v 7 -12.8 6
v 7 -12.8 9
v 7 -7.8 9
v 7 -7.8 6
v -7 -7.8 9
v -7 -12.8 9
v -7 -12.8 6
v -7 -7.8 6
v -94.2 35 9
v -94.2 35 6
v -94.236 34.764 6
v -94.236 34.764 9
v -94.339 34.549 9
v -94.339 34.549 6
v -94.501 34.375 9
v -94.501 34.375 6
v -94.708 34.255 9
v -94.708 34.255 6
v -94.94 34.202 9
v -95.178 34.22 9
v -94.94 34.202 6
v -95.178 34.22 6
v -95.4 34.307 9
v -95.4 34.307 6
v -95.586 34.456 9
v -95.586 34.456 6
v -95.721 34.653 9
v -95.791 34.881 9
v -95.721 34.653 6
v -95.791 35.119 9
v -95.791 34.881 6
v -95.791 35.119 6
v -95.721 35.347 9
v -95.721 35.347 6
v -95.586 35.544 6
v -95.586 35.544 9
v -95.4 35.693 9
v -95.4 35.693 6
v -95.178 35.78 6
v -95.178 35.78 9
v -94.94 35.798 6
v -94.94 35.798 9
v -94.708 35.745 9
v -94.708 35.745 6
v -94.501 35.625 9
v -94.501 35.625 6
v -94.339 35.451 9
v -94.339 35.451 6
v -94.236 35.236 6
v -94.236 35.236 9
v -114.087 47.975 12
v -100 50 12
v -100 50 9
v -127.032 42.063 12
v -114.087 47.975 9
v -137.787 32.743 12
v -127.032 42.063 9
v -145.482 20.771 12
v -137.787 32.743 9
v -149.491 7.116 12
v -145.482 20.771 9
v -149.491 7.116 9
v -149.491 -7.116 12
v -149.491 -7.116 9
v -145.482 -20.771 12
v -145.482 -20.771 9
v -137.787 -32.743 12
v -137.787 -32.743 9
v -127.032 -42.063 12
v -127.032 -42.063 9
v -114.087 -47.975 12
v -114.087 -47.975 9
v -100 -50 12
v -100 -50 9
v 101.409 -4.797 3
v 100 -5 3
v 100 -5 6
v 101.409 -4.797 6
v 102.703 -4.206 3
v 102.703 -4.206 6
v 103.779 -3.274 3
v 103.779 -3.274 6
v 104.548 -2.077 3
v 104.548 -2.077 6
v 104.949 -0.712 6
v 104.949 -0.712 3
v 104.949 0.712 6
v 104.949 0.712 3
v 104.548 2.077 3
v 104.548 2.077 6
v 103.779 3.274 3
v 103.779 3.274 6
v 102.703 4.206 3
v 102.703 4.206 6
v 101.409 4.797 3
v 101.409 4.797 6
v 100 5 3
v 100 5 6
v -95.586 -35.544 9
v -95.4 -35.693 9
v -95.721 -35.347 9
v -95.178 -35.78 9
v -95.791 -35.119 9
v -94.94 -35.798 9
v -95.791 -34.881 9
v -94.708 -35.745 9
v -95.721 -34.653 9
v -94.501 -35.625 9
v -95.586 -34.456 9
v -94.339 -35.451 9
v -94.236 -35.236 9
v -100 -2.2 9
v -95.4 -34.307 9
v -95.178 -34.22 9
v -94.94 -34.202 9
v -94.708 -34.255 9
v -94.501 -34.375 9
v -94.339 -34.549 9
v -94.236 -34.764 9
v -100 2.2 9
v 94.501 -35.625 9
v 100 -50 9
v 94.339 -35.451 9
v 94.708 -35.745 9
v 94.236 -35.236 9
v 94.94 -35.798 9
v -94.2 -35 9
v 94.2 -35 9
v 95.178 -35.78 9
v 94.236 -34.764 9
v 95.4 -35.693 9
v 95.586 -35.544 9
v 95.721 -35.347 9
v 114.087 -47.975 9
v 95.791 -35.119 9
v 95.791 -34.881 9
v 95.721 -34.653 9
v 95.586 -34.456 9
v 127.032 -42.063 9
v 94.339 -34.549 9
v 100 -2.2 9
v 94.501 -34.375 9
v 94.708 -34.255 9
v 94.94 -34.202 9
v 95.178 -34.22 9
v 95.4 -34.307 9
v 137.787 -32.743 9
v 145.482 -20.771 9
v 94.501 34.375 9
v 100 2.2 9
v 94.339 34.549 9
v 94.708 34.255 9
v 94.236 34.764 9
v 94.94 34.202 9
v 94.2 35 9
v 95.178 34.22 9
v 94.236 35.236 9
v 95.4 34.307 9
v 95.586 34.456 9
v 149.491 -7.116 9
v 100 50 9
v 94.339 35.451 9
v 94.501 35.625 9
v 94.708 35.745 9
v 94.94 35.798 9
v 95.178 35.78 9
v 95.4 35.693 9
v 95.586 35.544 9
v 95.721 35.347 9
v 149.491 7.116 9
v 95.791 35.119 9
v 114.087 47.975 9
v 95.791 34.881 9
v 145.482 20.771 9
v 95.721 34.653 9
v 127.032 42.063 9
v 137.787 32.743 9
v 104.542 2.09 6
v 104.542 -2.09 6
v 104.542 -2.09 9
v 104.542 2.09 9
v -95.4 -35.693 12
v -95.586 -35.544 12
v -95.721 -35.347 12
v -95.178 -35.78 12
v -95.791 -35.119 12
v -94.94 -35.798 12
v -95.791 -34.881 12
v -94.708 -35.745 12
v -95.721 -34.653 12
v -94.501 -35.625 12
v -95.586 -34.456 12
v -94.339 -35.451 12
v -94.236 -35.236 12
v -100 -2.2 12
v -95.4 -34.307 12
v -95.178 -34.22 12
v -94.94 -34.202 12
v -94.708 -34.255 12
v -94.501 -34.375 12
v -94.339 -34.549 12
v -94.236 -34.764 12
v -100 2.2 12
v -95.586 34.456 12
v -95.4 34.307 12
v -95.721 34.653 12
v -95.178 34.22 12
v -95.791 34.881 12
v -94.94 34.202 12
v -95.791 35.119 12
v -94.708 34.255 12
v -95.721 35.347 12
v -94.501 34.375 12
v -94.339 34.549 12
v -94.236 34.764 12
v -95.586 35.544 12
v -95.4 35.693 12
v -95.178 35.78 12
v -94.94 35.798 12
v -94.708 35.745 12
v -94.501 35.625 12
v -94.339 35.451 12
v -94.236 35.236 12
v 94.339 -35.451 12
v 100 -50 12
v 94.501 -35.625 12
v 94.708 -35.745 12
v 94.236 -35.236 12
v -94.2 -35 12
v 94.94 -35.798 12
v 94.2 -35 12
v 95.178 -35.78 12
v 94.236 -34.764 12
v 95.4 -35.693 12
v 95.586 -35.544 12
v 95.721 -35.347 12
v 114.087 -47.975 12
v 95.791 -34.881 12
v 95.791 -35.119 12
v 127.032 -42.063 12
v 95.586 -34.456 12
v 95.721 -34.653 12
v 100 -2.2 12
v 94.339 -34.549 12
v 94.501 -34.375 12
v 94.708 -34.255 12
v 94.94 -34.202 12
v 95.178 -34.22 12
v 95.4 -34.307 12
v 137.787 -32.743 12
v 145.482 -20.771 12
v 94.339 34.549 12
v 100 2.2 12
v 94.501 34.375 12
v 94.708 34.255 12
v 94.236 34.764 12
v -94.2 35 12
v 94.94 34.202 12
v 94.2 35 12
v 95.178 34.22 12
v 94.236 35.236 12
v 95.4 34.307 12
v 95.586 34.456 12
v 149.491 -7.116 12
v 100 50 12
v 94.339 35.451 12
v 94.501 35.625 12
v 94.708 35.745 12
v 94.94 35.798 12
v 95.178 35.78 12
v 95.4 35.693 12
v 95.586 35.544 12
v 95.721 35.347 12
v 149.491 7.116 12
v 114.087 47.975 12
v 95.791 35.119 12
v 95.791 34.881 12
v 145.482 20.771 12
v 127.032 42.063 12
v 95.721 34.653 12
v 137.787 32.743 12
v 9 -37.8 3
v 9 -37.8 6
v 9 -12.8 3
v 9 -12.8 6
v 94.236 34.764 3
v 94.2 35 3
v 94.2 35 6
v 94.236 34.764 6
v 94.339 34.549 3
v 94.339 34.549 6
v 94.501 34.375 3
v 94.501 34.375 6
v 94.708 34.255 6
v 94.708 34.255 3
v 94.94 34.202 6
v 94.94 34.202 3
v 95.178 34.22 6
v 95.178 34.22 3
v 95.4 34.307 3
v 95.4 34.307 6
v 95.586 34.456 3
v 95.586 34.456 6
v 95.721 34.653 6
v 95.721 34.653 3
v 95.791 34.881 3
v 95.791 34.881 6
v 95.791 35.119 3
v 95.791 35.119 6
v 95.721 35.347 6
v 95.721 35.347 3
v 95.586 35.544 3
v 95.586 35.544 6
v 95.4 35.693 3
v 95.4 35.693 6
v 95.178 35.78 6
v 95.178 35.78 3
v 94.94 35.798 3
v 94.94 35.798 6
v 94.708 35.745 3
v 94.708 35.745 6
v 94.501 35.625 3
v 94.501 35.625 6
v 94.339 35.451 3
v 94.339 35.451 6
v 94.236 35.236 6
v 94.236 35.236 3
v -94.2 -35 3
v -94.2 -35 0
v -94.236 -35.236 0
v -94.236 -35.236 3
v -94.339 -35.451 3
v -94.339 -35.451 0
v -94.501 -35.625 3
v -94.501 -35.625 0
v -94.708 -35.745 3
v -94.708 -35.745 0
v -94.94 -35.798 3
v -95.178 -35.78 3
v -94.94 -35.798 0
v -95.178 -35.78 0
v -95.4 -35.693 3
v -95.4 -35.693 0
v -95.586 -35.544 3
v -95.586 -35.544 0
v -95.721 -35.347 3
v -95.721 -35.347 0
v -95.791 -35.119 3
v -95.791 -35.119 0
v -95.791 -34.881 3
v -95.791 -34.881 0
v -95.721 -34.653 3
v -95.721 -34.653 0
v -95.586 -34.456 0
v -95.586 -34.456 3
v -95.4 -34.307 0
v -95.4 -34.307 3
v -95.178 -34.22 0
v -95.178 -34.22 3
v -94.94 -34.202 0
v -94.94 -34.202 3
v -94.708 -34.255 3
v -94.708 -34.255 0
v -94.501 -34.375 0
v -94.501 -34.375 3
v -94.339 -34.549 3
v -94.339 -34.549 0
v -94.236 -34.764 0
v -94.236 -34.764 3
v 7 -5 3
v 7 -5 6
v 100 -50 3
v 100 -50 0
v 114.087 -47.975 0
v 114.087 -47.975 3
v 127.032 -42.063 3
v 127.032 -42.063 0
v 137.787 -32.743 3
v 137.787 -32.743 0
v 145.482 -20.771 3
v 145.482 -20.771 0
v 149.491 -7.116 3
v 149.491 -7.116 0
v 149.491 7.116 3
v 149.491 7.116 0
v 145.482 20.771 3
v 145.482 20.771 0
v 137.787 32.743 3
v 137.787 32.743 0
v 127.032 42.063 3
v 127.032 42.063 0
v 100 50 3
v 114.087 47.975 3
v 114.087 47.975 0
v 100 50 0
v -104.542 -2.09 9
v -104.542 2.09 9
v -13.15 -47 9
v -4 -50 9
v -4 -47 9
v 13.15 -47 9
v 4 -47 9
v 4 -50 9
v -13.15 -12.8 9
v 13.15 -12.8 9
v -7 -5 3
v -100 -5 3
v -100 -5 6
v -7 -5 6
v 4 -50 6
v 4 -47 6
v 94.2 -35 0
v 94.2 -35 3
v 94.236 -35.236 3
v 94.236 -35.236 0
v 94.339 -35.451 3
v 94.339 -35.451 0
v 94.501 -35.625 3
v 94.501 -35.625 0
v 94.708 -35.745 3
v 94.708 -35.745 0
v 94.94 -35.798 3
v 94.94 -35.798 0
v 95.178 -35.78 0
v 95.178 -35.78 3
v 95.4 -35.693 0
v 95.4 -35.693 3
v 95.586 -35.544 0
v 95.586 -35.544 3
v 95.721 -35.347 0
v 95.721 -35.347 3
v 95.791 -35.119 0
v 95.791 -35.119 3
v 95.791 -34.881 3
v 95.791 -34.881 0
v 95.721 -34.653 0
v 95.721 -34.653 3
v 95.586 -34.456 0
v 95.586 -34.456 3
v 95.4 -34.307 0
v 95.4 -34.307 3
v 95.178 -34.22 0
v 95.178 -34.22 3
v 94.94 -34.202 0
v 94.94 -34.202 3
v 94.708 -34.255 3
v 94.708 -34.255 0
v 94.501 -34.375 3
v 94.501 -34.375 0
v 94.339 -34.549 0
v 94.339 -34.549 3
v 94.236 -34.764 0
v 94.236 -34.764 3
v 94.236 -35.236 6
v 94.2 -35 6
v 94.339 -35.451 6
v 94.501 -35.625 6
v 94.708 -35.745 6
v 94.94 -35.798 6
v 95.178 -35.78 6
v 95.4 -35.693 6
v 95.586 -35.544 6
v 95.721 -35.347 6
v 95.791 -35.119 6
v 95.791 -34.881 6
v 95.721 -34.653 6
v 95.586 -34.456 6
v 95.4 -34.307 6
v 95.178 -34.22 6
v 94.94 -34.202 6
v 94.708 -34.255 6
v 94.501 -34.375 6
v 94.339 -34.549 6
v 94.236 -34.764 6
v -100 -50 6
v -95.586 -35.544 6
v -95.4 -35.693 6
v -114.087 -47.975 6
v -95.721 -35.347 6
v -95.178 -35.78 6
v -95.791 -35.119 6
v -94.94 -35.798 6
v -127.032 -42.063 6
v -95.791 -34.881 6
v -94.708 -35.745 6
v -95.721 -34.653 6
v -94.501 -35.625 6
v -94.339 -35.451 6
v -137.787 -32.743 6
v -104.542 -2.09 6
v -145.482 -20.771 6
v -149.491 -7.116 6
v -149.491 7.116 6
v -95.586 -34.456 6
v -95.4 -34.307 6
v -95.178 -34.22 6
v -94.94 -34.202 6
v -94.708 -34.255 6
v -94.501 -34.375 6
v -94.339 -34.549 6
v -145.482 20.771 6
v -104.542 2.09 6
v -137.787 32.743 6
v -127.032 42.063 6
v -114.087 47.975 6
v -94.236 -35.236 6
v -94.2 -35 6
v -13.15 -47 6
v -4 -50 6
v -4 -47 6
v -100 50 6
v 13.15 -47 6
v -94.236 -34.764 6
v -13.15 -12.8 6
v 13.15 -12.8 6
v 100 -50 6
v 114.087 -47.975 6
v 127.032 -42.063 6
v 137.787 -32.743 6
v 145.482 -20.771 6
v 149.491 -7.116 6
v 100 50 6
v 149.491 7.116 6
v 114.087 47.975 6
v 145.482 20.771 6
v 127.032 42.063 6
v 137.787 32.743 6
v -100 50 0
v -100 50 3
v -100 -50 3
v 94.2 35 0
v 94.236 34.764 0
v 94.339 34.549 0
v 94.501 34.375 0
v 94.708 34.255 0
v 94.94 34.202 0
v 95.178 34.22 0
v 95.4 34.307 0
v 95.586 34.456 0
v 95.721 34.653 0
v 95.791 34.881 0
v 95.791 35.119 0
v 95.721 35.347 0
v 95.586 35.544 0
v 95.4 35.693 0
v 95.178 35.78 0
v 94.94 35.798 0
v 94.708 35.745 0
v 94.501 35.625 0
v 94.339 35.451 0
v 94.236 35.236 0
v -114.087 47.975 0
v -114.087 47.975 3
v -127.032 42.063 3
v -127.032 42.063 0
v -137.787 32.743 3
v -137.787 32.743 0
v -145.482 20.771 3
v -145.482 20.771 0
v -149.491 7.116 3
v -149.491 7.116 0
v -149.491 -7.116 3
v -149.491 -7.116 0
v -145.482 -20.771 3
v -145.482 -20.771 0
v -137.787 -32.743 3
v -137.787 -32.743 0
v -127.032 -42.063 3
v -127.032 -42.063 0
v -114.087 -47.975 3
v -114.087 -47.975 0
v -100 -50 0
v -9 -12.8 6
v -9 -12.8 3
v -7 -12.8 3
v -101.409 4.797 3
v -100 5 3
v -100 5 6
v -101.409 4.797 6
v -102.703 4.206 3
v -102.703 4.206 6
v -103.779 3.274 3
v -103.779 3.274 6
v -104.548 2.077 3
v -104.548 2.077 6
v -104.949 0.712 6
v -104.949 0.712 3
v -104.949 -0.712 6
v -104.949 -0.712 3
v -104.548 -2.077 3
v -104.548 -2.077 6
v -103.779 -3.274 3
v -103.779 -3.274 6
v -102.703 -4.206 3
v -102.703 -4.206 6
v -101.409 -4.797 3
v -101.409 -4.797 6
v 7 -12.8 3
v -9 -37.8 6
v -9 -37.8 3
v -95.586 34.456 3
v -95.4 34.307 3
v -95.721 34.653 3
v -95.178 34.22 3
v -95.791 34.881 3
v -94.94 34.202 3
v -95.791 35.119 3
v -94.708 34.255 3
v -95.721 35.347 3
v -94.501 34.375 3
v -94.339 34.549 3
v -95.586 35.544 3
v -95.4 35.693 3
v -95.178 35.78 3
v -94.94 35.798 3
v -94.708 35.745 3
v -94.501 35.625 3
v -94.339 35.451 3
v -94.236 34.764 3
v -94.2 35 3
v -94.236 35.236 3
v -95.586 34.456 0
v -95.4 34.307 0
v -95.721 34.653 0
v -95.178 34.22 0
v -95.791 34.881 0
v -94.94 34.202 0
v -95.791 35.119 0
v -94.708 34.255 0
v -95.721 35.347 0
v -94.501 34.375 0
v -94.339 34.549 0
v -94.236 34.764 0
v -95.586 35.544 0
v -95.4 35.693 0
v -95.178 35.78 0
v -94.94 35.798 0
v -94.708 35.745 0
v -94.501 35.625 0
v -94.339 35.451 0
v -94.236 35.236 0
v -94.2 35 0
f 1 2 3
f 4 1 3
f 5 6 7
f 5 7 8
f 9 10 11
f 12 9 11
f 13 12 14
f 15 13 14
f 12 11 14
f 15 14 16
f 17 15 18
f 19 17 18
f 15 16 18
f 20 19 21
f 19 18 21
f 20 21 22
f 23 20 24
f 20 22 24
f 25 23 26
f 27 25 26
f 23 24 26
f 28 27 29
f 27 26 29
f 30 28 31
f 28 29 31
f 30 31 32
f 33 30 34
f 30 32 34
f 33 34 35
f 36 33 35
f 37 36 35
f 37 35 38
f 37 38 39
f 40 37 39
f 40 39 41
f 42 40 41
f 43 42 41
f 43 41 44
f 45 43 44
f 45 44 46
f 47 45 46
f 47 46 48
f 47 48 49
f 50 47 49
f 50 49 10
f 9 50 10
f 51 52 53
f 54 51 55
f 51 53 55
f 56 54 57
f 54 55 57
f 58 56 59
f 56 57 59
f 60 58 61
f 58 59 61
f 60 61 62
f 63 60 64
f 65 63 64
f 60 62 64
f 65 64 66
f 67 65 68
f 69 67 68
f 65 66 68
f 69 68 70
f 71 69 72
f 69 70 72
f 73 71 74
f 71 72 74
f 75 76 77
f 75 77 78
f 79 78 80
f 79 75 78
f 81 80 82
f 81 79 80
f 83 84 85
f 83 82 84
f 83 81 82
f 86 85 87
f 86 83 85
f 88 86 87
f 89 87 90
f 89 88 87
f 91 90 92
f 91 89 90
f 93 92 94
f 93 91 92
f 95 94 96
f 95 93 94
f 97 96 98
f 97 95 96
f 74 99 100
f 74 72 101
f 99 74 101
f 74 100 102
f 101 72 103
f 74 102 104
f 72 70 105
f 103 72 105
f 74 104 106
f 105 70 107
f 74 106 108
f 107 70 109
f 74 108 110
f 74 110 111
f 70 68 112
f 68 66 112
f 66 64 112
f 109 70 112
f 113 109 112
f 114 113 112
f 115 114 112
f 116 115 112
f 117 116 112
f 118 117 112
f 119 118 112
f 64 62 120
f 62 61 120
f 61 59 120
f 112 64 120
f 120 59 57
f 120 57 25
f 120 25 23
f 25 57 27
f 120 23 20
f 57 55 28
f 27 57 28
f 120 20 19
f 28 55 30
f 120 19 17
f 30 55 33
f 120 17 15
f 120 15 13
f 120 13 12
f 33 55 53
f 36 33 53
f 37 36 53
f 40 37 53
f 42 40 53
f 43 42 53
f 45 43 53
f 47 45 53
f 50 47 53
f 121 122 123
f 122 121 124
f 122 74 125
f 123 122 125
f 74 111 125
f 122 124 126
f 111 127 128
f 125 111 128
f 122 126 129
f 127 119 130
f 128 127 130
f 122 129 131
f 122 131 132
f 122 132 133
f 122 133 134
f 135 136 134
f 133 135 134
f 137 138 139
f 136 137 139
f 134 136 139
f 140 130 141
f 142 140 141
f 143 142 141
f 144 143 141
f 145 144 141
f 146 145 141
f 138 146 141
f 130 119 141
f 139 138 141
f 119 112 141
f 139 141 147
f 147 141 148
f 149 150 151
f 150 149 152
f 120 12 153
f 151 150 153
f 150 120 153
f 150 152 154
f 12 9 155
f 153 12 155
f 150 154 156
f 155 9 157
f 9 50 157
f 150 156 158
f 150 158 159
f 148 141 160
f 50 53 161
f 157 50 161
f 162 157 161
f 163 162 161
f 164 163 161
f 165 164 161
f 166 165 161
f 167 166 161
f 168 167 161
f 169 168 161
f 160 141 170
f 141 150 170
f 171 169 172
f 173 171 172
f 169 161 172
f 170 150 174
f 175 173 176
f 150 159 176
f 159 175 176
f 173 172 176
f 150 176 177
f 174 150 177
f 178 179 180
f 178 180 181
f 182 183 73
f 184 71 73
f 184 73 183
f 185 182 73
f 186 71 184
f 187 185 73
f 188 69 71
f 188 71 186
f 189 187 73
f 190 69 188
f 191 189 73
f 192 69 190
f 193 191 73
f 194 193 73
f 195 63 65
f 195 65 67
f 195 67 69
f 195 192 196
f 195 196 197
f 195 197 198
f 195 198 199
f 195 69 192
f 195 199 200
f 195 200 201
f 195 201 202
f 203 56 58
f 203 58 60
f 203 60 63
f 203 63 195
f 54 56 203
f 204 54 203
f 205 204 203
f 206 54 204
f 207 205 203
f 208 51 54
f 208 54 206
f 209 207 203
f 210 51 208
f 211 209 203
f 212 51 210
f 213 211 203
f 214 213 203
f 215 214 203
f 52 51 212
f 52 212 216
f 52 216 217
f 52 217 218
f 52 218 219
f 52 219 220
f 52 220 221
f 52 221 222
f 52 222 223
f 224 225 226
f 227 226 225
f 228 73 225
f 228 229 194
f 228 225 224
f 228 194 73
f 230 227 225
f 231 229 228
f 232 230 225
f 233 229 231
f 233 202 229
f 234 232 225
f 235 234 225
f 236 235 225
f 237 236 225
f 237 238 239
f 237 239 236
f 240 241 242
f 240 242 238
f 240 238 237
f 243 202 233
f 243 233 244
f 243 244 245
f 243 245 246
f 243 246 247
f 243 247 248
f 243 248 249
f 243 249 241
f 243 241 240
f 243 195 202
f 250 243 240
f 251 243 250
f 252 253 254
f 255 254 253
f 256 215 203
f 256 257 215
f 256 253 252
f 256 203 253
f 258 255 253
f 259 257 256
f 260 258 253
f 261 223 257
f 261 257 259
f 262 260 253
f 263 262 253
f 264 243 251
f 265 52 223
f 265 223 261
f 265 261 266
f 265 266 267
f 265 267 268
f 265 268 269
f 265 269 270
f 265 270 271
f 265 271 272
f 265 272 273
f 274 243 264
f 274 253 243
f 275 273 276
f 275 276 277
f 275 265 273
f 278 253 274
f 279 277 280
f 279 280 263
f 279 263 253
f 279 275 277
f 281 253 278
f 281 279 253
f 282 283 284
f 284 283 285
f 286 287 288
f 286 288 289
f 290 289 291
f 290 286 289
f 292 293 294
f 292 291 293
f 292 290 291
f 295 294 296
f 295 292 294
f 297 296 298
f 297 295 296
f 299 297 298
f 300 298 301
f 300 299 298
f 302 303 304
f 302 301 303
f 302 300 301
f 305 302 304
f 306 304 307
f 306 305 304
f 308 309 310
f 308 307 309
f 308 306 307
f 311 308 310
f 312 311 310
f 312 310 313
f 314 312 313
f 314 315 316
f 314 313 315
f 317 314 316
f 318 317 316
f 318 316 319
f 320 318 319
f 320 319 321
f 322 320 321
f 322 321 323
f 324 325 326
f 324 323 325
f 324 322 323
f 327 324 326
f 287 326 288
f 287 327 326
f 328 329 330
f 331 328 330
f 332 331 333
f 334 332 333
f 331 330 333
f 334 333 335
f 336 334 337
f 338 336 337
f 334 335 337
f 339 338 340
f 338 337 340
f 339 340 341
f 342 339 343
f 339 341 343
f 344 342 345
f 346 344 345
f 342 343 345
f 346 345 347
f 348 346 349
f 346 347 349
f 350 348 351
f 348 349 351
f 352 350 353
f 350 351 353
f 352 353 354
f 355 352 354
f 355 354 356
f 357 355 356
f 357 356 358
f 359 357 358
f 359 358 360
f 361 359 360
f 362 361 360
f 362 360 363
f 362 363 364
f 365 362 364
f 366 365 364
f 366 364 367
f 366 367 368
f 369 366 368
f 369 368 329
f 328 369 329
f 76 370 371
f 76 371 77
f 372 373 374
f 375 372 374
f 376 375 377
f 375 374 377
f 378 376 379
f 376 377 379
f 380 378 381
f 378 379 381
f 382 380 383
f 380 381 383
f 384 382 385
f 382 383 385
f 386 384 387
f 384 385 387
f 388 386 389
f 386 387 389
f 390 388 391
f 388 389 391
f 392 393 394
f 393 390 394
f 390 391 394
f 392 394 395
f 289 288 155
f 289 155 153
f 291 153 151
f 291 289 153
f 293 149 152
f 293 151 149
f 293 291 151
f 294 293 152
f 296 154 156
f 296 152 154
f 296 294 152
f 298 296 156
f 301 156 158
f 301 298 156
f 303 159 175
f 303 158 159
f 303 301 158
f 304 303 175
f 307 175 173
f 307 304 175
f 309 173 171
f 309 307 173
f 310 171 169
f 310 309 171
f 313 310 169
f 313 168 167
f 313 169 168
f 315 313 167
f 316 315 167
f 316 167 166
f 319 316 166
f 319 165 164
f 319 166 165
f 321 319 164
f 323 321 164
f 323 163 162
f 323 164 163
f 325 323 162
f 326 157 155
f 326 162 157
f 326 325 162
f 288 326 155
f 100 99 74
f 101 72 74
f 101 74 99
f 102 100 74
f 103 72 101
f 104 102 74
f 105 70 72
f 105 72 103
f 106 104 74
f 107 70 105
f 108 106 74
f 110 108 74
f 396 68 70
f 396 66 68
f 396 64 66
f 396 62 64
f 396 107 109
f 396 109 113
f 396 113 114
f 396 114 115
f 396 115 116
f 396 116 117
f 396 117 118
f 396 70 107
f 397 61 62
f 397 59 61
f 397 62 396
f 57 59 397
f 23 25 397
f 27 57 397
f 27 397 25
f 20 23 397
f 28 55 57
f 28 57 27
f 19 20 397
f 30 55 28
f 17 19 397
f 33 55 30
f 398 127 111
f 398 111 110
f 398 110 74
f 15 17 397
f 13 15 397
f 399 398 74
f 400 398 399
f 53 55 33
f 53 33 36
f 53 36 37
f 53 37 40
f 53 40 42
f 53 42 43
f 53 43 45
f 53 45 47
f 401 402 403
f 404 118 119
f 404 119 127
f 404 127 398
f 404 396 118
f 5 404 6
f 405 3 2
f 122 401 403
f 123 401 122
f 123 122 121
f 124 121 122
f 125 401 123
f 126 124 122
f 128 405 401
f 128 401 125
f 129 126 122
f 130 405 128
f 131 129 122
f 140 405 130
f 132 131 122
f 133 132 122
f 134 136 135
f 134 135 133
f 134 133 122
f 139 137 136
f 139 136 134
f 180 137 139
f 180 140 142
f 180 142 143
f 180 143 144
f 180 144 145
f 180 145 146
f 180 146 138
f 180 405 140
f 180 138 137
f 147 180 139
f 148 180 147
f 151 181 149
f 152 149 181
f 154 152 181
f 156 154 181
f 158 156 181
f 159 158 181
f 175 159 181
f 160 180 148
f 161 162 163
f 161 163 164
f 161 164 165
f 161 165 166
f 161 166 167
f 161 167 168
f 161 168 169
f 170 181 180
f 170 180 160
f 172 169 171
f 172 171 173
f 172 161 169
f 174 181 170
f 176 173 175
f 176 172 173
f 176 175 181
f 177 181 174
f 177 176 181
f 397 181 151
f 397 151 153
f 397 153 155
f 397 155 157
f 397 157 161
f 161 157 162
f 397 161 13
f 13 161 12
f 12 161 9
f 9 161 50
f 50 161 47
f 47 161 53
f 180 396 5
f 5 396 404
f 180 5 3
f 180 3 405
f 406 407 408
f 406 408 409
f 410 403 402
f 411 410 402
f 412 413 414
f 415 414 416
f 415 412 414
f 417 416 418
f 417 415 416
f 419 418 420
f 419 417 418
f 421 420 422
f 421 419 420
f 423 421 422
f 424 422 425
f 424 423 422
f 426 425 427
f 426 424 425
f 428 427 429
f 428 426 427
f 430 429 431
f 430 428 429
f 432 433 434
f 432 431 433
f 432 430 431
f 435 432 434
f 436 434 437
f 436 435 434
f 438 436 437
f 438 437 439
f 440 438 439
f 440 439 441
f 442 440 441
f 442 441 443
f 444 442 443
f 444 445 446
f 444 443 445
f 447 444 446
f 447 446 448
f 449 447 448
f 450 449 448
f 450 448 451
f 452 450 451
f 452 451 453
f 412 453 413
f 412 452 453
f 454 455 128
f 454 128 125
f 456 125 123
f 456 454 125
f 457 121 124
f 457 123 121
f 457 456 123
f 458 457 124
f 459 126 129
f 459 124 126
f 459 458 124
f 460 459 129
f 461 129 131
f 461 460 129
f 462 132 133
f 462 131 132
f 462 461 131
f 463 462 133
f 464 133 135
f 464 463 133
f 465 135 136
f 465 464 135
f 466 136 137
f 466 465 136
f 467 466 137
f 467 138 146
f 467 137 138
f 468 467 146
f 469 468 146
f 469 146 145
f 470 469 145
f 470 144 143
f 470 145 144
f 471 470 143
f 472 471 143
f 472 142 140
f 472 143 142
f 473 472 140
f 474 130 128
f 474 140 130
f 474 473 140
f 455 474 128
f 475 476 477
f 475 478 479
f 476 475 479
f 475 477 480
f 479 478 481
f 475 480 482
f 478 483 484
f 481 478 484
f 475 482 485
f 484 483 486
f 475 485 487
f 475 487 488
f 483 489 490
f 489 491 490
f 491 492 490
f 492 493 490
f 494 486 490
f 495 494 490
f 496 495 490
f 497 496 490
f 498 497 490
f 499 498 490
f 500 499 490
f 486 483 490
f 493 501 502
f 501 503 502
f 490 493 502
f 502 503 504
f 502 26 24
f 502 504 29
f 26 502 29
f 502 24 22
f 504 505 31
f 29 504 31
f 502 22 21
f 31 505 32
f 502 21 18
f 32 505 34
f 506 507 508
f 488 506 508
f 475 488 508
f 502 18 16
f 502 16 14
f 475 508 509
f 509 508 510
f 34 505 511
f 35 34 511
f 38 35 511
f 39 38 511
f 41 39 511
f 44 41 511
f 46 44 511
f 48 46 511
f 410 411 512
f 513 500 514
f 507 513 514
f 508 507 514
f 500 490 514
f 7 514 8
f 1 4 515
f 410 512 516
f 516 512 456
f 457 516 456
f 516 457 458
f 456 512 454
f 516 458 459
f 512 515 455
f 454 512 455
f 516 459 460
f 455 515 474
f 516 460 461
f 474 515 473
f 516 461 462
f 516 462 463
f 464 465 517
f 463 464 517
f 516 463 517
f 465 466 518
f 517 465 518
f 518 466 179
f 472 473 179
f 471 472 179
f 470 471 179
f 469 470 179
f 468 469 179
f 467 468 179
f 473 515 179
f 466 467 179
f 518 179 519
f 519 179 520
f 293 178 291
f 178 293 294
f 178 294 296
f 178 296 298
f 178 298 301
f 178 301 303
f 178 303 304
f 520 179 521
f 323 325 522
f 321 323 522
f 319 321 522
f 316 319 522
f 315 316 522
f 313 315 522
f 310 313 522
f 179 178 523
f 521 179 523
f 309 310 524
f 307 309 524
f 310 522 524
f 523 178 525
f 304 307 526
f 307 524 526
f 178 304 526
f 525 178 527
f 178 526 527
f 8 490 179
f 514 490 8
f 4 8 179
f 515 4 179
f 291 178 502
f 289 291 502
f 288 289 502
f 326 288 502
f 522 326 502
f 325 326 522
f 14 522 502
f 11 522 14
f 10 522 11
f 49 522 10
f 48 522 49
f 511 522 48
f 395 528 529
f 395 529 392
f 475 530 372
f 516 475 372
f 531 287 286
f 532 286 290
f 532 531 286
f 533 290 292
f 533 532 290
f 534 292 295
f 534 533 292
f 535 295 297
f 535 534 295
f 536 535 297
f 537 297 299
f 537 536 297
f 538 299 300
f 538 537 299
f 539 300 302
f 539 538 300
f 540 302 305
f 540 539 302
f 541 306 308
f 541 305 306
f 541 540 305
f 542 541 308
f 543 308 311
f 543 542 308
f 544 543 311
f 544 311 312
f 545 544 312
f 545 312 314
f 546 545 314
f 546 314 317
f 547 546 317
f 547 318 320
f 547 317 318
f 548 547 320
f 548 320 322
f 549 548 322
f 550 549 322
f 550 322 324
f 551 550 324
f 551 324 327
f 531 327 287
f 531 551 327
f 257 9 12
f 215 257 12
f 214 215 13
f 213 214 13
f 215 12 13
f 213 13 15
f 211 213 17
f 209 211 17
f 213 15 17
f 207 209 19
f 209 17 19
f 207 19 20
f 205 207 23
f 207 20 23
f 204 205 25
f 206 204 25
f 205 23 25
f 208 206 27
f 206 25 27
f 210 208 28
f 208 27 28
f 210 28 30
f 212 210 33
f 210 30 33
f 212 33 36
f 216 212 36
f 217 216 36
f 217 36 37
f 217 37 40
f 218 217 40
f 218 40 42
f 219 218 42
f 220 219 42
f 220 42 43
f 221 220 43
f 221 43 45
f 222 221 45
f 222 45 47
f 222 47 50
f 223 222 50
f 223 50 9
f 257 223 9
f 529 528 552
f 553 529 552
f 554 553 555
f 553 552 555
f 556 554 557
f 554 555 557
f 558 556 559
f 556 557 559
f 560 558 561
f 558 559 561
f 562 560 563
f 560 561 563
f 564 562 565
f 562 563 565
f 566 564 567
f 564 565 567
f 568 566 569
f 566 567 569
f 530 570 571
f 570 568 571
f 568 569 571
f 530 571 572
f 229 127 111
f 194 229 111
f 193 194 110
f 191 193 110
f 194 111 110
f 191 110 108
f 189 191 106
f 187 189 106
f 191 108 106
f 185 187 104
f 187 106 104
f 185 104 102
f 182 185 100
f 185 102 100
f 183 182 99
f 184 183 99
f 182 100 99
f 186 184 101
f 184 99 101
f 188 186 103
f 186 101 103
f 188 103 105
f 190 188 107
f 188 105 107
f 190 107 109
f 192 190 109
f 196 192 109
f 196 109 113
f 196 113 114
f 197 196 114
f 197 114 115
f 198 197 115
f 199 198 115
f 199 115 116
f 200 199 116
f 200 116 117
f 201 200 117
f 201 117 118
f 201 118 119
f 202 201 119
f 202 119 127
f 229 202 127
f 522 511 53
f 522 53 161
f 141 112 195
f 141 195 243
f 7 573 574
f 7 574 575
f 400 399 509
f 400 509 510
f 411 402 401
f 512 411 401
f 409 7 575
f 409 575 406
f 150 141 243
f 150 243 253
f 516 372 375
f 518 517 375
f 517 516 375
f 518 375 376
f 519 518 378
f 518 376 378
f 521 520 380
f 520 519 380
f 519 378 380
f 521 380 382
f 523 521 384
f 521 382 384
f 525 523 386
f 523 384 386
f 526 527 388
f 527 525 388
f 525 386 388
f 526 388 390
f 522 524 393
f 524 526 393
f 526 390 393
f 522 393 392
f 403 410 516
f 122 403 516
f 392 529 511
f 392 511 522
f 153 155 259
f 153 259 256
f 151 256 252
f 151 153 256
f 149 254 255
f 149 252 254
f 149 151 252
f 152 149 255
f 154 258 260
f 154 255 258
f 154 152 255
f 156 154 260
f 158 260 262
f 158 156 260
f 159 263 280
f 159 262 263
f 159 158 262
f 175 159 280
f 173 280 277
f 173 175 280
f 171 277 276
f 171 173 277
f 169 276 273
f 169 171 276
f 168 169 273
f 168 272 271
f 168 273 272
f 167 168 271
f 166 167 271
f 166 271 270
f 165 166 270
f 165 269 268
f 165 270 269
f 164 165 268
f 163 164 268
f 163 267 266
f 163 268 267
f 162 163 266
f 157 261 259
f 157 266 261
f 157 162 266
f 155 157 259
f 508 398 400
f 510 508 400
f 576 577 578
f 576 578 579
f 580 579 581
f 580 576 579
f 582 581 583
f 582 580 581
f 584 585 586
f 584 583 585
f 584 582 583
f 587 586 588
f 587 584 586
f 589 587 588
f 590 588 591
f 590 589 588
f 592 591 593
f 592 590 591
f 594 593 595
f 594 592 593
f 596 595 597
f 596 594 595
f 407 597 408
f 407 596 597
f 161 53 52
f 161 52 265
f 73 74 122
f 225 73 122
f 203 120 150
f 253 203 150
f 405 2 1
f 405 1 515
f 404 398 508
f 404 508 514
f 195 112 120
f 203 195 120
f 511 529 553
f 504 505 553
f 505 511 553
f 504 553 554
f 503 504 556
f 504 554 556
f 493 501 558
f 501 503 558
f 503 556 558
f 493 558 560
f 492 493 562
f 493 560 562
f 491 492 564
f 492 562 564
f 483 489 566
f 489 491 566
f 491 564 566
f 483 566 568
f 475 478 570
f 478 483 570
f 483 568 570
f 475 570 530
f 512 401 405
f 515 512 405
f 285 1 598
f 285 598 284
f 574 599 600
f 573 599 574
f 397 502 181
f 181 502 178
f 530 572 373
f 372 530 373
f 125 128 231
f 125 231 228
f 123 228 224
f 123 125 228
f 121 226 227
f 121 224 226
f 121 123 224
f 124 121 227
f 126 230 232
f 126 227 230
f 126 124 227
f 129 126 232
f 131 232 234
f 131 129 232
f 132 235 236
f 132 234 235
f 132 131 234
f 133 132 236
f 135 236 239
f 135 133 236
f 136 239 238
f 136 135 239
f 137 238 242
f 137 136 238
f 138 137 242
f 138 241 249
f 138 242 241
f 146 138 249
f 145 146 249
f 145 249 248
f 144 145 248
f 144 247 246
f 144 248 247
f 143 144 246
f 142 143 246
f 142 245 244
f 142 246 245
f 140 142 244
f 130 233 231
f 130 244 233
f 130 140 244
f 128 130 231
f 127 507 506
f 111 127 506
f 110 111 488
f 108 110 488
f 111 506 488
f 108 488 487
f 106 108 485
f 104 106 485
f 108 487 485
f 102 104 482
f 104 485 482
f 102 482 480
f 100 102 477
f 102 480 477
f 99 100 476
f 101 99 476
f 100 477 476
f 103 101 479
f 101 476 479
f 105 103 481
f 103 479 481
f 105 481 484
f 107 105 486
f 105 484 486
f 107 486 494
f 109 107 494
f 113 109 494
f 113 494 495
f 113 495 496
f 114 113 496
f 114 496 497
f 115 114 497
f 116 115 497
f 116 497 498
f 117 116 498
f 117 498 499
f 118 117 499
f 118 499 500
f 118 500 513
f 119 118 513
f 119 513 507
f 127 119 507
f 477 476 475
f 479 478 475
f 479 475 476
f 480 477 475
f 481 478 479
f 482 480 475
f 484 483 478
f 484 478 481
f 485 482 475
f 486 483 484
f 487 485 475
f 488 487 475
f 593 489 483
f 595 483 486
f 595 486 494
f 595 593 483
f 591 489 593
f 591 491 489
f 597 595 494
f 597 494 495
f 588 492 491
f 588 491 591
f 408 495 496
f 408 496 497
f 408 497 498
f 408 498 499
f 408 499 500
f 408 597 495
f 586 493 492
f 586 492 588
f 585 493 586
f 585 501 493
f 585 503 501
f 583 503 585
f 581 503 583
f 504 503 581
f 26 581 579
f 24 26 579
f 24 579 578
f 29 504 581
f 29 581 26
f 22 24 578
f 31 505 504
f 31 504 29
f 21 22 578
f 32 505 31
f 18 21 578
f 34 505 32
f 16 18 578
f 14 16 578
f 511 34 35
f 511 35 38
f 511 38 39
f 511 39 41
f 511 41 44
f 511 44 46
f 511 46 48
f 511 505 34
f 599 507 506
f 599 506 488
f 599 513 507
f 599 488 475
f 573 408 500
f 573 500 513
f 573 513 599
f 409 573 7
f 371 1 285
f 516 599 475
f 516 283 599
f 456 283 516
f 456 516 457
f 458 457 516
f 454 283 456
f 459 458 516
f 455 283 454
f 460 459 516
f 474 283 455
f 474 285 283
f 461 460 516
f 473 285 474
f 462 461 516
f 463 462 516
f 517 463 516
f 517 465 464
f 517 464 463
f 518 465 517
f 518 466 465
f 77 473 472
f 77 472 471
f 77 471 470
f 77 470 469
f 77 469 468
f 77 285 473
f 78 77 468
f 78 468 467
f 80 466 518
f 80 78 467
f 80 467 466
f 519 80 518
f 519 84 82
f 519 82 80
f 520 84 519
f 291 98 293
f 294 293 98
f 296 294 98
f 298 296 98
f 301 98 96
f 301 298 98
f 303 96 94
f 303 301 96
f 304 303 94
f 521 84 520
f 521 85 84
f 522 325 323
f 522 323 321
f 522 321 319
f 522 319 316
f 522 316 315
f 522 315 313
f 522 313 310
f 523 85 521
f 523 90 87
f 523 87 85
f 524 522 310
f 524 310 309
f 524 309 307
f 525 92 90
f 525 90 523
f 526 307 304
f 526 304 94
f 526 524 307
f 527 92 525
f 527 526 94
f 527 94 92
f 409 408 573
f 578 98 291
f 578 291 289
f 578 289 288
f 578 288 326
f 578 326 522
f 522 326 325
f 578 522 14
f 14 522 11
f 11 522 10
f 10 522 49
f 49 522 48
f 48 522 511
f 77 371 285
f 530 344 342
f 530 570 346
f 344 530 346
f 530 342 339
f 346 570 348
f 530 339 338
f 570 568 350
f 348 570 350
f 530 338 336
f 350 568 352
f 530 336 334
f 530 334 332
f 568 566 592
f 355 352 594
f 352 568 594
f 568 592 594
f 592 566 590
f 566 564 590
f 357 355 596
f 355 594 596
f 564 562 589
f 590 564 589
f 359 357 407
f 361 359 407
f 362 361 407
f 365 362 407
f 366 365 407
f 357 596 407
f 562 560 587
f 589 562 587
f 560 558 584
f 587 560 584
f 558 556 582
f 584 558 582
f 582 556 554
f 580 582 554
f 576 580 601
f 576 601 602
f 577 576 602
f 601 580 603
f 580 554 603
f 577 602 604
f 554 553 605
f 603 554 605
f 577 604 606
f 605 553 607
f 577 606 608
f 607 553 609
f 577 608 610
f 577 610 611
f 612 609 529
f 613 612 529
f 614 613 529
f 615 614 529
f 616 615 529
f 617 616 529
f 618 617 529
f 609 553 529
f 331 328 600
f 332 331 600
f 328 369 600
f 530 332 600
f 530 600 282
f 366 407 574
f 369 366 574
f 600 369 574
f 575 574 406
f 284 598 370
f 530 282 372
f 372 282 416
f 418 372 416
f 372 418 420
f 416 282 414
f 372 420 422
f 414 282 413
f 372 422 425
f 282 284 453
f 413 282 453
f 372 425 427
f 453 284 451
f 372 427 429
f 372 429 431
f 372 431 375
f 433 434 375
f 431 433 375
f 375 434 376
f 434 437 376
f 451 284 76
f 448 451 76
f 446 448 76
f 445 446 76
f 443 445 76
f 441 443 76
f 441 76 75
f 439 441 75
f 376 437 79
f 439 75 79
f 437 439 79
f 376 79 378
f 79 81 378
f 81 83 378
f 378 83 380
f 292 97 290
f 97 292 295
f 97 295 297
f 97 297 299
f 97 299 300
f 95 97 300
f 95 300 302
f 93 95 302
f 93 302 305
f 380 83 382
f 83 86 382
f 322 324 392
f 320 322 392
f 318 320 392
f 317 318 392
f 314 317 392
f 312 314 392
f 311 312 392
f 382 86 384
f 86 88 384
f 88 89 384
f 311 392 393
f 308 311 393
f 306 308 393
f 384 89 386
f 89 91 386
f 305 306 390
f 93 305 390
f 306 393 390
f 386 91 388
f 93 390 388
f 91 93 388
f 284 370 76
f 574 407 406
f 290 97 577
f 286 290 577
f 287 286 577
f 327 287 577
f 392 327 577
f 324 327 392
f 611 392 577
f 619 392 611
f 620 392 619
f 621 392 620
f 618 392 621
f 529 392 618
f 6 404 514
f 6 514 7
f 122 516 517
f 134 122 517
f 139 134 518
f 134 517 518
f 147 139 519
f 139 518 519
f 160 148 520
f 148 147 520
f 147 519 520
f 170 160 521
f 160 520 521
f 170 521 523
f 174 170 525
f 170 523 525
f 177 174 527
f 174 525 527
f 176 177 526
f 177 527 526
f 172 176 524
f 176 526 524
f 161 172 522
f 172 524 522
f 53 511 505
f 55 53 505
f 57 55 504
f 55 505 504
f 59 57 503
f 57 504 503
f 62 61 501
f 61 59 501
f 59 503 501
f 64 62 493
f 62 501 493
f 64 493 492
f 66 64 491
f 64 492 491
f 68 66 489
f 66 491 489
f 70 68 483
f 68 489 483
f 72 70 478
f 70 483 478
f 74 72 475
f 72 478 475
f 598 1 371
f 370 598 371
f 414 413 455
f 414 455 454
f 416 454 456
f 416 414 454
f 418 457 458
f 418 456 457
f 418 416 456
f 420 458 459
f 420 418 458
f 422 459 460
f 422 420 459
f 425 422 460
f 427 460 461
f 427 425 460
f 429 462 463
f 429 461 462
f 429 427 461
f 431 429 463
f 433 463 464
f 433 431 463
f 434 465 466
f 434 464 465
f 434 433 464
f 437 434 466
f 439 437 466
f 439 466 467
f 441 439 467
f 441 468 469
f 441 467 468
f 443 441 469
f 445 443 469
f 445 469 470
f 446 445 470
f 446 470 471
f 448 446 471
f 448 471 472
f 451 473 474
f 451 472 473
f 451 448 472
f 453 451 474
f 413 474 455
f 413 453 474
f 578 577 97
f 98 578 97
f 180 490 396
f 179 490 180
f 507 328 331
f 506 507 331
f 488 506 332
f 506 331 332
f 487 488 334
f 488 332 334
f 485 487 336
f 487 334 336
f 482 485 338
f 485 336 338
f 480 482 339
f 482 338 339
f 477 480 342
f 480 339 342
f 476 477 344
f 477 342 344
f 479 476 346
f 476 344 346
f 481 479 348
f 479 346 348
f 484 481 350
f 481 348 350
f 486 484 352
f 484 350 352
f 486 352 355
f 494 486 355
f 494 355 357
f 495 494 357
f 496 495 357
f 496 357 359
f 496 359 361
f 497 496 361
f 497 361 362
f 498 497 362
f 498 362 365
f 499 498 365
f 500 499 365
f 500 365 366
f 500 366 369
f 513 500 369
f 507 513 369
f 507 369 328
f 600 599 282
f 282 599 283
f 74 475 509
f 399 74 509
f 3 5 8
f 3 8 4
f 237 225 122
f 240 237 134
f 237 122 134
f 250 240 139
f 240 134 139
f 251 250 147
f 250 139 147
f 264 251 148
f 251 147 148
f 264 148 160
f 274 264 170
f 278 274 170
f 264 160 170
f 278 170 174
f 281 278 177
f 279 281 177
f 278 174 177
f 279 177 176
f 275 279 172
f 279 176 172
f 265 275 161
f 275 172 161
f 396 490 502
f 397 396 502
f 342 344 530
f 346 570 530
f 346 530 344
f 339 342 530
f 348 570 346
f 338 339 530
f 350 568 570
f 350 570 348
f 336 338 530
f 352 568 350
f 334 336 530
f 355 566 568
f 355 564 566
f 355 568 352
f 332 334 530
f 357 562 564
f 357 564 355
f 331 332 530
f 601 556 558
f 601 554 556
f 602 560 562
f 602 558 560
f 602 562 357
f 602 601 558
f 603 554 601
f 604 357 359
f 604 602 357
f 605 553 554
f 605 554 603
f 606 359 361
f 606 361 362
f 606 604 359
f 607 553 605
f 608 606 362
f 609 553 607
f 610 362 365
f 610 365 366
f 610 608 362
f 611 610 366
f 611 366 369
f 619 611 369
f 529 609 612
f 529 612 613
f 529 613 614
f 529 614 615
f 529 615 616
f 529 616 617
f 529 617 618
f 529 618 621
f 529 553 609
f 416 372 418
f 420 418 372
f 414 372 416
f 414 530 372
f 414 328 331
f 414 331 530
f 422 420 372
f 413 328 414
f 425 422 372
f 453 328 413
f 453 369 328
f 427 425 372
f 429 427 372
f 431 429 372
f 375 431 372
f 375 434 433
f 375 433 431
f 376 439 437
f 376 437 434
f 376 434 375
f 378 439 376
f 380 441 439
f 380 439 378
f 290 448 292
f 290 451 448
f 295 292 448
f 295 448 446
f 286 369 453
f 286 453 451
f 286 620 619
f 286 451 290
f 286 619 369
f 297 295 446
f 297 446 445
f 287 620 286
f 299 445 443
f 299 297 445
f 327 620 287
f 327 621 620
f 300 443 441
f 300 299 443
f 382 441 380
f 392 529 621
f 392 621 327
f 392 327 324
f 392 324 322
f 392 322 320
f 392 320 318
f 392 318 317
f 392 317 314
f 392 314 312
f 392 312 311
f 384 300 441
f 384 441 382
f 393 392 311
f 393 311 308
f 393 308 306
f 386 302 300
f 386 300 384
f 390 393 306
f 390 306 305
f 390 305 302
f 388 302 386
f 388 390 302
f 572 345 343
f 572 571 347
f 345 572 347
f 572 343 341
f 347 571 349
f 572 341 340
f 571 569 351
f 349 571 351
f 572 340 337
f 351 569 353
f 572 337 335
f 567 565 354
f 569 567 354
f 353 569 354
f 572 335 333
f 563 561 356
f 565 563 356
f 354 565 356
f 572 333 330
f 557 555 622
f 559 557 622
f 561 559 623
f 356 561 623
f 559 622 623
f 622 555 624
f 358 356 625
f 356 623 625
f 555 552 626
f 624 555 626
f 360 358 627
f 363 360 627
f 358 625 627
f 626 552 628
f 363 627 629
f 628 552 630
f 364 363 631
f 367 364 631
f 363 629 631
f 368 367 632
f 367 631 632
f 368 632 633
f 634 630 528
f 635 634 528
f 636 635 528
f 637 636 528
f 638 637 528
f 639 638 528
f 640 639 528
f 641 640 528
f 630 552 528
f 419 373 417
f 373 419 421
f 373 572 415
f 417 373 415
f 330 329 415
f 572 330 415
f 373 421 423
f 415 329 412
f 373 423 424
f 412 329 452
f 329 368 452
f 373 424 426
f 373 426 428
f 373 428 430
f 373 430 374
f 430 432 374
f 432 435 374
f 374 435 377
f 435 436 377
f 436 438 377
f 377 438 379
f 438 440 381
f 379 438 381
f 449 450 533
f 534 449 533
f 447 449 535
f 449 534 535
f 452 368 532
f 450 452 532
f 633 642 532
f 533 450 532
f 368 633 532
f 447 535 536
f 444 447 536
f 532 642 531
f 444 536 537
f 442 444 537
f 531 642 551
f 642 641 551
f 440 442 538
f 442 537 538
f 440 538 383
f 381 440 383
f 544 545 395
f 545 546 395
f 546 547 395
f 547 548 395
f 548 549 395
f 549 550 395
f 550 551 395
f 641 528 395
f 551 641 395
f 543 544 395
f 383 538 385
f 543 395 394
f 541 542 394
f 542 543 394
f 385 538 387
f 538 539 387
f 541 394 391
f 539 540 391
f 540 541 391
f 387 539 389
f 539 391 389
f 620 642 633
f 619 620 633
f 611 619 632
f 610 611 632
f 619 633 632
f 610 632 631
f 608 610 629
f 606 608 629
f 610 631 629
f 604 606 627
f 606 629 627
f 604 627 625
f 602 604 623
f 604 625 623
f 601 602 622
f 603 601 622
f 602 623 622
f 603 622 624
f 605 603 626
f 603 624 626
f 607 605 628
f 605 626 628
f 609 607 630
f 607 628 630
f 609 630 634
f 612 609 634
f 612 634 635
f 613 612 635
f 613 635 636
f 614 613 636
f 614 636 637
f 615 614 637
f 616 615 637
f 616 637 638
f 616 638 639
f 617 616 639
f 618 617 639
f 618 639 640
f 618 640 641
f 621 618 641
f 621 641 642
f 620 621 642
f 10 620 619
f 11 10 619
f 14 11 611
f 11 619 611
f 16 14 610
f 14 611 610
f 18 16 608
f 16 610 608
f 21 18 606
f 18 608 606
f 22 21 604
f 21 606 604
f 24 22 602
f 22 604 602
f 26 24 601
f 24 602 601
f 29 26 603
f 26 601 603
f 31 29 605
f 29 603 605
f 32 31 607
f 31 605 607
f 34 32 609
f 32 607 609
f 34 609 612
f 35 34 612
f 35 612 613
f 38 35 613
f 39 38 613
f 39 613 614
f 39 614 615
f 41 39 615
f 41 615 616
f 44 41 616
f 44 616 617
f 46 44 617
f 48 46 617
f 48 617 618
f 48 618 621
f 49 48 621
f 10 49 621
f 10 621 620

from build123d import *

# Parameters (mm, degrees)
BOX_BOTTOM_HALF_1_W     = 301.98633
BOX_BOTTOM_HALF_1_H     = 102
BOX_BOTTOM_HALF_1_DEPTH = 4
BOX_BOTTOM_HALF_0_W     = 301.98633
BOX_BOTTOM_HALF_0_H     = 102
BOX_BOTTOM_HALF_0_DEPTH = 7
PAD_DEPTH               = 3
PAD001_DEPTH            = 3
SKETCH002_W             = 209.08447
SKETCH002_H             = 4.18
PAD002_DEPTH            = 3
SKETCH003_W             = 26.3
SKETCH003_H             = 34.2
POCKET_DEPTH            = 3
SKETCH004_W             = 18
SKETCH004_H             = 25
POCKET001_DEPTH         = 3
SKETCH005_W             = 14
SKETCH005_H             = 5
POCKET002_DEPTH         = 6
SKETCH006_W             = 14
SKETCH006_H             = 3
POCKET003_DEPTH         = 3
SKETCH007_W             = 8
SKETCH007_H             = 3
POCKET004_DEPTH         = 3
SKETCH008_W             = 200
SKETCH008_H             = 4.4
PAD003_DEPTH            = 3
SKETCH009_R             = 0.8
POCKET005_DEPTH         = 644.911736
BOX_BOTTOM_HALF_2_W     = 301.98633
BOX_BOTTOM_HALF_2_H     = 102
BOX_BOTTOM_HALF_2_DEPTH = 4


with BuildPart() as box_bottom_half_1_body:
    # box_bottom_half_1 → box_bottom_half_1 (new body)
    with BuildSketch(Plane(origin=(-150.993165, -51, -1), x_dir=(1, 0, 0), z_dir=(0, 0, 1))):
        with Locations((150.993165, 51)):
            Rectangle(BOX_BOTTOM_HALF_1_W, BOX_BOTTOM_HALF_1_H)
    extrude(amount=BOX_BOTTOM_HALF_1_DEPTH)


with BuildPart() as box_bottom_half_0_body:
    # box_bottom_half_0 → box_bottom_half_0 (new body)
    with BuildSketch(Plane(origin=(-150.993165, -51, -1), x_dir=(1, 0, 0), z_dir=(0, 0, 1))):
        with Locations((150.993165, 51)):
            Rectangle(BOX_BOTTOM_HALF_0_W, BOX_BOTTOM_HALF_0_H)
    extrude(amount=BOX_BOTTOM_HALF_0_DEPTH)


with BuildPart() as body:
    # Sketch → Pad (new body)
    with BuildSketch(Plane.XY):
        with BuildLine():
            ThreePointArc((-100, 50), (-150, 0), (-100, -50))
            Line((-100, -50), (100, -50))
            ThreePointArc((100, -50), (150, 0), (100, 50))
            Line((-100, 50), (100, 50))
        make_face()
    extrude(amount=PAD_DEPTH)

    # Sketch001 (on Face6 of Pad) → Pad001 (join)
    with BuildSketch(Plane.XY.offset(3)):
        with BuildLine():
            ThreePointArc((-100, 50), (-150, 0), (-100, -50))
            Line((-100, -50), (100, -50))
            ThreePointArc((100, -50), (150, 0), (100, 50))
            Line((-100, 50), (100, 50))
        make_face()
        with BuildLine():
            ThreePointArc((-100, 5), (-105, 0), (-100, -5))
            Line((-100, -5), (100, -5))
            ThreePointArc((100, -5), (105, 0), (100, 5))
            Line((-100, 5), (100, 5))
        make_face(mode=Mode.SUBTRACT)
    extrude(amount=PAD001_DEPTH)

    # Sketch002 (on Face9 of Pad001) → Pad002 (join)
    with BuildSketch(Plane.XY.offset(6)):
        with BuildLine():
            ThreePointArc((-100, 50), (-150, 0), (-100, -50))
            Line((-100, -50), (100, -50))
            ThreePointArc((100, -50), (150, 0), (100, 50))
            Line((-100, 50), (100, 50))
        make_face()
        Rectangle(SKETCH002_W, SKETCH002_H, mode=Mode.SUBTRACT)
    extrude(amount=PAD002_DEPTH)

    # Sketch003 (on Face13 of Pad002) → Pocket (cut)
    with BuildSketch(Plane.XY.offset(9)):
        with Locations((0, -29.9)):
            Rectangle(SKETCH003_W, SKETCH003_H)
    extrude(amount=-POCKET_DEPTH, mode=Mode.SUBTRACT)

    # Sketch004 (on Face27 of Pocket) → Pocket001 (cut)
    with BuildSketch(Plane.XY.offset(6)):
        with Locations((0, -25.3)):
            Rectangle(SKETCH004_W, SKETCH004_H)
    extrude(amount=-POCKET001_DEPTH, mode=Mode.SUBTRACT)

    # Sketch005 (on Face13 of Pocket001) → Pocket002 (cut)
    with BuildSketch(Plane.XY.offset(9)):
        with Locations((0, -10.3)):
            Rectangle(SKETCH005_W, SKETCH005_H)
    extrude(amount=-POCKET002_DEPTH, mode=Mode.SUBTRACT)

    # Sketch006 (on Face23 of Pocket002) → Pocket003 (cut)
    with BuildSketch(Plane.XZ.offset(7.8)):
        with Locations((0, 4.5)):
            Rectangle(SKETCH006_W, SKETCH006_H)
    extrude(amount=-POCKET003_DEPTH, mode=Mode.SUBTRACT)

    # Sketch007 (on Face13 of Pocket003) → Pocket004 (cut)
    with BuildSketch(Plane.XY.offset(9)):
        with Locations((0, -48.5)):
            Rectangle(SKETCH007_W, SKETCH007_H)
    extrude(amount=-POCKET004_DEPTH, mode=Mode.SUBTRACT)

    # Sketch008 (on Face15 of Pocket004) → Pad003 (join)
    with BuildSketch(Plane.XY.offset(9)):
        with BuildLine():
            ThreePointArc((-100, 50), (-150, 0), (-100, -50))
            Line((-100, -50), (100, -50))
            ThreePointArc((100, -50), (150, 0), (100, 50))
            Line((-100, 50), (100, 50))
        make_face()
        Rectangle(SKETCH008_W, SKETCH008_H, mode=Mode.SUBTRACT)
    extrude(amount=PAD003_DEPTH)

    # Sketch009 (on Face4 of Pad003) → Pocket005 (cut, through all)
    with BuildSketch(Plane(origin=(0, 0, 0), x_dir=(1, 0, 0), z_dir=(0, 0, -1))):
        with Locations((-95, 35)):
            Circle(SKETCH009_R)
        with Locations((-95, -35)):
            Circle(SKETCH009_R)
    pocket005 = extrude(amount=-POCKET005_DEPTH, mode=Mode.SUBTRACT)

    # Mirrored: Pocket005 across Sketch009 V_Axis
    add(pocket005.mirror(Plane(origin=(0, 0, 0), x_dir=(0, 0, -1), z_dir=(1, 0, 0))), mode=Mode.SUBTRACT)


with BuildPart() as bottom_half_0_body:
    # bottom_half_0 base: copy of Body
    add(body.part)

    # bottom_half_0: intersect box_bottom_half_0 body
    add(box_bottom_half_0_body.part, mode=Mode.INTERSECT)


with BuildPart() as bottom_half_1_body:
    # bottom_half_1 base: copy of bottom_half_0 body
    add(bottom_half_0_body.part)

    # bottom_half_1: intersect box_bottom_half_1 body
    add(box_bottom_half_1_body.part, mode=Mode.INTERSECT)


with BuildPart() as top_half_1_body:
    # top_half_1 base: copy of bottom_half_0 body
    add(bottom_half_0_body.part)

    # top_half_1: cut box_bottom_half_1 body
    add(box_bottom_half_1_body.part, mode=Mode.SUBTRACT)


with BuildPart() as box_bottom_half_2_body:
    # box_bottom_half_2 → box_bottom_half_2 (new body)
    with BuildSketch(Plane(origin=(-150.993165, -51, 5), x_dir=(1, 0, 0), z_dir=(0, 0, 1))):
        with Locations((150.993165, 51)):
            Rectangle(BOX_BOTTOM_HALF_2_W, BOX_BOTTOM_HALF_2_H)
    extrude(amount=BOX_BOTTOM_HALF_2_DEPTH)


with BuildPart() as top_half_0_body:
    # top_half_0 base: copy of Body
    add(body.part)

    # top_half_0: cut box_bottom_half_0 body
    add(box_bottom_half_0_body.part, mode=Mode.SUBTRACT)


with BuildPart() as bottom_half_2_body:
    # bottom_half_2 base: copy of top_half_0 body
    add(top_half_0_body.part)

    # bottom_half_2: intersect box_bottom_half_2 body
    add(box_bottom_half_2_body.part, mode=Mode.INTERSECT)


with BuildPart() as top_half_2_body:
    # top_half_2 base: copy of top_half_0 body
    add(top_half_0_body.part)

    # top_half_2: cut box_bottom_half_2 body
    add(box_bottom_half_2_body.part, mode=Mode.SUBTRACT)


solid = Compound([bottom_half_1_body.part, top_half_1_body.part, bottom_half_2_body.part, top_half_2_body.part])
